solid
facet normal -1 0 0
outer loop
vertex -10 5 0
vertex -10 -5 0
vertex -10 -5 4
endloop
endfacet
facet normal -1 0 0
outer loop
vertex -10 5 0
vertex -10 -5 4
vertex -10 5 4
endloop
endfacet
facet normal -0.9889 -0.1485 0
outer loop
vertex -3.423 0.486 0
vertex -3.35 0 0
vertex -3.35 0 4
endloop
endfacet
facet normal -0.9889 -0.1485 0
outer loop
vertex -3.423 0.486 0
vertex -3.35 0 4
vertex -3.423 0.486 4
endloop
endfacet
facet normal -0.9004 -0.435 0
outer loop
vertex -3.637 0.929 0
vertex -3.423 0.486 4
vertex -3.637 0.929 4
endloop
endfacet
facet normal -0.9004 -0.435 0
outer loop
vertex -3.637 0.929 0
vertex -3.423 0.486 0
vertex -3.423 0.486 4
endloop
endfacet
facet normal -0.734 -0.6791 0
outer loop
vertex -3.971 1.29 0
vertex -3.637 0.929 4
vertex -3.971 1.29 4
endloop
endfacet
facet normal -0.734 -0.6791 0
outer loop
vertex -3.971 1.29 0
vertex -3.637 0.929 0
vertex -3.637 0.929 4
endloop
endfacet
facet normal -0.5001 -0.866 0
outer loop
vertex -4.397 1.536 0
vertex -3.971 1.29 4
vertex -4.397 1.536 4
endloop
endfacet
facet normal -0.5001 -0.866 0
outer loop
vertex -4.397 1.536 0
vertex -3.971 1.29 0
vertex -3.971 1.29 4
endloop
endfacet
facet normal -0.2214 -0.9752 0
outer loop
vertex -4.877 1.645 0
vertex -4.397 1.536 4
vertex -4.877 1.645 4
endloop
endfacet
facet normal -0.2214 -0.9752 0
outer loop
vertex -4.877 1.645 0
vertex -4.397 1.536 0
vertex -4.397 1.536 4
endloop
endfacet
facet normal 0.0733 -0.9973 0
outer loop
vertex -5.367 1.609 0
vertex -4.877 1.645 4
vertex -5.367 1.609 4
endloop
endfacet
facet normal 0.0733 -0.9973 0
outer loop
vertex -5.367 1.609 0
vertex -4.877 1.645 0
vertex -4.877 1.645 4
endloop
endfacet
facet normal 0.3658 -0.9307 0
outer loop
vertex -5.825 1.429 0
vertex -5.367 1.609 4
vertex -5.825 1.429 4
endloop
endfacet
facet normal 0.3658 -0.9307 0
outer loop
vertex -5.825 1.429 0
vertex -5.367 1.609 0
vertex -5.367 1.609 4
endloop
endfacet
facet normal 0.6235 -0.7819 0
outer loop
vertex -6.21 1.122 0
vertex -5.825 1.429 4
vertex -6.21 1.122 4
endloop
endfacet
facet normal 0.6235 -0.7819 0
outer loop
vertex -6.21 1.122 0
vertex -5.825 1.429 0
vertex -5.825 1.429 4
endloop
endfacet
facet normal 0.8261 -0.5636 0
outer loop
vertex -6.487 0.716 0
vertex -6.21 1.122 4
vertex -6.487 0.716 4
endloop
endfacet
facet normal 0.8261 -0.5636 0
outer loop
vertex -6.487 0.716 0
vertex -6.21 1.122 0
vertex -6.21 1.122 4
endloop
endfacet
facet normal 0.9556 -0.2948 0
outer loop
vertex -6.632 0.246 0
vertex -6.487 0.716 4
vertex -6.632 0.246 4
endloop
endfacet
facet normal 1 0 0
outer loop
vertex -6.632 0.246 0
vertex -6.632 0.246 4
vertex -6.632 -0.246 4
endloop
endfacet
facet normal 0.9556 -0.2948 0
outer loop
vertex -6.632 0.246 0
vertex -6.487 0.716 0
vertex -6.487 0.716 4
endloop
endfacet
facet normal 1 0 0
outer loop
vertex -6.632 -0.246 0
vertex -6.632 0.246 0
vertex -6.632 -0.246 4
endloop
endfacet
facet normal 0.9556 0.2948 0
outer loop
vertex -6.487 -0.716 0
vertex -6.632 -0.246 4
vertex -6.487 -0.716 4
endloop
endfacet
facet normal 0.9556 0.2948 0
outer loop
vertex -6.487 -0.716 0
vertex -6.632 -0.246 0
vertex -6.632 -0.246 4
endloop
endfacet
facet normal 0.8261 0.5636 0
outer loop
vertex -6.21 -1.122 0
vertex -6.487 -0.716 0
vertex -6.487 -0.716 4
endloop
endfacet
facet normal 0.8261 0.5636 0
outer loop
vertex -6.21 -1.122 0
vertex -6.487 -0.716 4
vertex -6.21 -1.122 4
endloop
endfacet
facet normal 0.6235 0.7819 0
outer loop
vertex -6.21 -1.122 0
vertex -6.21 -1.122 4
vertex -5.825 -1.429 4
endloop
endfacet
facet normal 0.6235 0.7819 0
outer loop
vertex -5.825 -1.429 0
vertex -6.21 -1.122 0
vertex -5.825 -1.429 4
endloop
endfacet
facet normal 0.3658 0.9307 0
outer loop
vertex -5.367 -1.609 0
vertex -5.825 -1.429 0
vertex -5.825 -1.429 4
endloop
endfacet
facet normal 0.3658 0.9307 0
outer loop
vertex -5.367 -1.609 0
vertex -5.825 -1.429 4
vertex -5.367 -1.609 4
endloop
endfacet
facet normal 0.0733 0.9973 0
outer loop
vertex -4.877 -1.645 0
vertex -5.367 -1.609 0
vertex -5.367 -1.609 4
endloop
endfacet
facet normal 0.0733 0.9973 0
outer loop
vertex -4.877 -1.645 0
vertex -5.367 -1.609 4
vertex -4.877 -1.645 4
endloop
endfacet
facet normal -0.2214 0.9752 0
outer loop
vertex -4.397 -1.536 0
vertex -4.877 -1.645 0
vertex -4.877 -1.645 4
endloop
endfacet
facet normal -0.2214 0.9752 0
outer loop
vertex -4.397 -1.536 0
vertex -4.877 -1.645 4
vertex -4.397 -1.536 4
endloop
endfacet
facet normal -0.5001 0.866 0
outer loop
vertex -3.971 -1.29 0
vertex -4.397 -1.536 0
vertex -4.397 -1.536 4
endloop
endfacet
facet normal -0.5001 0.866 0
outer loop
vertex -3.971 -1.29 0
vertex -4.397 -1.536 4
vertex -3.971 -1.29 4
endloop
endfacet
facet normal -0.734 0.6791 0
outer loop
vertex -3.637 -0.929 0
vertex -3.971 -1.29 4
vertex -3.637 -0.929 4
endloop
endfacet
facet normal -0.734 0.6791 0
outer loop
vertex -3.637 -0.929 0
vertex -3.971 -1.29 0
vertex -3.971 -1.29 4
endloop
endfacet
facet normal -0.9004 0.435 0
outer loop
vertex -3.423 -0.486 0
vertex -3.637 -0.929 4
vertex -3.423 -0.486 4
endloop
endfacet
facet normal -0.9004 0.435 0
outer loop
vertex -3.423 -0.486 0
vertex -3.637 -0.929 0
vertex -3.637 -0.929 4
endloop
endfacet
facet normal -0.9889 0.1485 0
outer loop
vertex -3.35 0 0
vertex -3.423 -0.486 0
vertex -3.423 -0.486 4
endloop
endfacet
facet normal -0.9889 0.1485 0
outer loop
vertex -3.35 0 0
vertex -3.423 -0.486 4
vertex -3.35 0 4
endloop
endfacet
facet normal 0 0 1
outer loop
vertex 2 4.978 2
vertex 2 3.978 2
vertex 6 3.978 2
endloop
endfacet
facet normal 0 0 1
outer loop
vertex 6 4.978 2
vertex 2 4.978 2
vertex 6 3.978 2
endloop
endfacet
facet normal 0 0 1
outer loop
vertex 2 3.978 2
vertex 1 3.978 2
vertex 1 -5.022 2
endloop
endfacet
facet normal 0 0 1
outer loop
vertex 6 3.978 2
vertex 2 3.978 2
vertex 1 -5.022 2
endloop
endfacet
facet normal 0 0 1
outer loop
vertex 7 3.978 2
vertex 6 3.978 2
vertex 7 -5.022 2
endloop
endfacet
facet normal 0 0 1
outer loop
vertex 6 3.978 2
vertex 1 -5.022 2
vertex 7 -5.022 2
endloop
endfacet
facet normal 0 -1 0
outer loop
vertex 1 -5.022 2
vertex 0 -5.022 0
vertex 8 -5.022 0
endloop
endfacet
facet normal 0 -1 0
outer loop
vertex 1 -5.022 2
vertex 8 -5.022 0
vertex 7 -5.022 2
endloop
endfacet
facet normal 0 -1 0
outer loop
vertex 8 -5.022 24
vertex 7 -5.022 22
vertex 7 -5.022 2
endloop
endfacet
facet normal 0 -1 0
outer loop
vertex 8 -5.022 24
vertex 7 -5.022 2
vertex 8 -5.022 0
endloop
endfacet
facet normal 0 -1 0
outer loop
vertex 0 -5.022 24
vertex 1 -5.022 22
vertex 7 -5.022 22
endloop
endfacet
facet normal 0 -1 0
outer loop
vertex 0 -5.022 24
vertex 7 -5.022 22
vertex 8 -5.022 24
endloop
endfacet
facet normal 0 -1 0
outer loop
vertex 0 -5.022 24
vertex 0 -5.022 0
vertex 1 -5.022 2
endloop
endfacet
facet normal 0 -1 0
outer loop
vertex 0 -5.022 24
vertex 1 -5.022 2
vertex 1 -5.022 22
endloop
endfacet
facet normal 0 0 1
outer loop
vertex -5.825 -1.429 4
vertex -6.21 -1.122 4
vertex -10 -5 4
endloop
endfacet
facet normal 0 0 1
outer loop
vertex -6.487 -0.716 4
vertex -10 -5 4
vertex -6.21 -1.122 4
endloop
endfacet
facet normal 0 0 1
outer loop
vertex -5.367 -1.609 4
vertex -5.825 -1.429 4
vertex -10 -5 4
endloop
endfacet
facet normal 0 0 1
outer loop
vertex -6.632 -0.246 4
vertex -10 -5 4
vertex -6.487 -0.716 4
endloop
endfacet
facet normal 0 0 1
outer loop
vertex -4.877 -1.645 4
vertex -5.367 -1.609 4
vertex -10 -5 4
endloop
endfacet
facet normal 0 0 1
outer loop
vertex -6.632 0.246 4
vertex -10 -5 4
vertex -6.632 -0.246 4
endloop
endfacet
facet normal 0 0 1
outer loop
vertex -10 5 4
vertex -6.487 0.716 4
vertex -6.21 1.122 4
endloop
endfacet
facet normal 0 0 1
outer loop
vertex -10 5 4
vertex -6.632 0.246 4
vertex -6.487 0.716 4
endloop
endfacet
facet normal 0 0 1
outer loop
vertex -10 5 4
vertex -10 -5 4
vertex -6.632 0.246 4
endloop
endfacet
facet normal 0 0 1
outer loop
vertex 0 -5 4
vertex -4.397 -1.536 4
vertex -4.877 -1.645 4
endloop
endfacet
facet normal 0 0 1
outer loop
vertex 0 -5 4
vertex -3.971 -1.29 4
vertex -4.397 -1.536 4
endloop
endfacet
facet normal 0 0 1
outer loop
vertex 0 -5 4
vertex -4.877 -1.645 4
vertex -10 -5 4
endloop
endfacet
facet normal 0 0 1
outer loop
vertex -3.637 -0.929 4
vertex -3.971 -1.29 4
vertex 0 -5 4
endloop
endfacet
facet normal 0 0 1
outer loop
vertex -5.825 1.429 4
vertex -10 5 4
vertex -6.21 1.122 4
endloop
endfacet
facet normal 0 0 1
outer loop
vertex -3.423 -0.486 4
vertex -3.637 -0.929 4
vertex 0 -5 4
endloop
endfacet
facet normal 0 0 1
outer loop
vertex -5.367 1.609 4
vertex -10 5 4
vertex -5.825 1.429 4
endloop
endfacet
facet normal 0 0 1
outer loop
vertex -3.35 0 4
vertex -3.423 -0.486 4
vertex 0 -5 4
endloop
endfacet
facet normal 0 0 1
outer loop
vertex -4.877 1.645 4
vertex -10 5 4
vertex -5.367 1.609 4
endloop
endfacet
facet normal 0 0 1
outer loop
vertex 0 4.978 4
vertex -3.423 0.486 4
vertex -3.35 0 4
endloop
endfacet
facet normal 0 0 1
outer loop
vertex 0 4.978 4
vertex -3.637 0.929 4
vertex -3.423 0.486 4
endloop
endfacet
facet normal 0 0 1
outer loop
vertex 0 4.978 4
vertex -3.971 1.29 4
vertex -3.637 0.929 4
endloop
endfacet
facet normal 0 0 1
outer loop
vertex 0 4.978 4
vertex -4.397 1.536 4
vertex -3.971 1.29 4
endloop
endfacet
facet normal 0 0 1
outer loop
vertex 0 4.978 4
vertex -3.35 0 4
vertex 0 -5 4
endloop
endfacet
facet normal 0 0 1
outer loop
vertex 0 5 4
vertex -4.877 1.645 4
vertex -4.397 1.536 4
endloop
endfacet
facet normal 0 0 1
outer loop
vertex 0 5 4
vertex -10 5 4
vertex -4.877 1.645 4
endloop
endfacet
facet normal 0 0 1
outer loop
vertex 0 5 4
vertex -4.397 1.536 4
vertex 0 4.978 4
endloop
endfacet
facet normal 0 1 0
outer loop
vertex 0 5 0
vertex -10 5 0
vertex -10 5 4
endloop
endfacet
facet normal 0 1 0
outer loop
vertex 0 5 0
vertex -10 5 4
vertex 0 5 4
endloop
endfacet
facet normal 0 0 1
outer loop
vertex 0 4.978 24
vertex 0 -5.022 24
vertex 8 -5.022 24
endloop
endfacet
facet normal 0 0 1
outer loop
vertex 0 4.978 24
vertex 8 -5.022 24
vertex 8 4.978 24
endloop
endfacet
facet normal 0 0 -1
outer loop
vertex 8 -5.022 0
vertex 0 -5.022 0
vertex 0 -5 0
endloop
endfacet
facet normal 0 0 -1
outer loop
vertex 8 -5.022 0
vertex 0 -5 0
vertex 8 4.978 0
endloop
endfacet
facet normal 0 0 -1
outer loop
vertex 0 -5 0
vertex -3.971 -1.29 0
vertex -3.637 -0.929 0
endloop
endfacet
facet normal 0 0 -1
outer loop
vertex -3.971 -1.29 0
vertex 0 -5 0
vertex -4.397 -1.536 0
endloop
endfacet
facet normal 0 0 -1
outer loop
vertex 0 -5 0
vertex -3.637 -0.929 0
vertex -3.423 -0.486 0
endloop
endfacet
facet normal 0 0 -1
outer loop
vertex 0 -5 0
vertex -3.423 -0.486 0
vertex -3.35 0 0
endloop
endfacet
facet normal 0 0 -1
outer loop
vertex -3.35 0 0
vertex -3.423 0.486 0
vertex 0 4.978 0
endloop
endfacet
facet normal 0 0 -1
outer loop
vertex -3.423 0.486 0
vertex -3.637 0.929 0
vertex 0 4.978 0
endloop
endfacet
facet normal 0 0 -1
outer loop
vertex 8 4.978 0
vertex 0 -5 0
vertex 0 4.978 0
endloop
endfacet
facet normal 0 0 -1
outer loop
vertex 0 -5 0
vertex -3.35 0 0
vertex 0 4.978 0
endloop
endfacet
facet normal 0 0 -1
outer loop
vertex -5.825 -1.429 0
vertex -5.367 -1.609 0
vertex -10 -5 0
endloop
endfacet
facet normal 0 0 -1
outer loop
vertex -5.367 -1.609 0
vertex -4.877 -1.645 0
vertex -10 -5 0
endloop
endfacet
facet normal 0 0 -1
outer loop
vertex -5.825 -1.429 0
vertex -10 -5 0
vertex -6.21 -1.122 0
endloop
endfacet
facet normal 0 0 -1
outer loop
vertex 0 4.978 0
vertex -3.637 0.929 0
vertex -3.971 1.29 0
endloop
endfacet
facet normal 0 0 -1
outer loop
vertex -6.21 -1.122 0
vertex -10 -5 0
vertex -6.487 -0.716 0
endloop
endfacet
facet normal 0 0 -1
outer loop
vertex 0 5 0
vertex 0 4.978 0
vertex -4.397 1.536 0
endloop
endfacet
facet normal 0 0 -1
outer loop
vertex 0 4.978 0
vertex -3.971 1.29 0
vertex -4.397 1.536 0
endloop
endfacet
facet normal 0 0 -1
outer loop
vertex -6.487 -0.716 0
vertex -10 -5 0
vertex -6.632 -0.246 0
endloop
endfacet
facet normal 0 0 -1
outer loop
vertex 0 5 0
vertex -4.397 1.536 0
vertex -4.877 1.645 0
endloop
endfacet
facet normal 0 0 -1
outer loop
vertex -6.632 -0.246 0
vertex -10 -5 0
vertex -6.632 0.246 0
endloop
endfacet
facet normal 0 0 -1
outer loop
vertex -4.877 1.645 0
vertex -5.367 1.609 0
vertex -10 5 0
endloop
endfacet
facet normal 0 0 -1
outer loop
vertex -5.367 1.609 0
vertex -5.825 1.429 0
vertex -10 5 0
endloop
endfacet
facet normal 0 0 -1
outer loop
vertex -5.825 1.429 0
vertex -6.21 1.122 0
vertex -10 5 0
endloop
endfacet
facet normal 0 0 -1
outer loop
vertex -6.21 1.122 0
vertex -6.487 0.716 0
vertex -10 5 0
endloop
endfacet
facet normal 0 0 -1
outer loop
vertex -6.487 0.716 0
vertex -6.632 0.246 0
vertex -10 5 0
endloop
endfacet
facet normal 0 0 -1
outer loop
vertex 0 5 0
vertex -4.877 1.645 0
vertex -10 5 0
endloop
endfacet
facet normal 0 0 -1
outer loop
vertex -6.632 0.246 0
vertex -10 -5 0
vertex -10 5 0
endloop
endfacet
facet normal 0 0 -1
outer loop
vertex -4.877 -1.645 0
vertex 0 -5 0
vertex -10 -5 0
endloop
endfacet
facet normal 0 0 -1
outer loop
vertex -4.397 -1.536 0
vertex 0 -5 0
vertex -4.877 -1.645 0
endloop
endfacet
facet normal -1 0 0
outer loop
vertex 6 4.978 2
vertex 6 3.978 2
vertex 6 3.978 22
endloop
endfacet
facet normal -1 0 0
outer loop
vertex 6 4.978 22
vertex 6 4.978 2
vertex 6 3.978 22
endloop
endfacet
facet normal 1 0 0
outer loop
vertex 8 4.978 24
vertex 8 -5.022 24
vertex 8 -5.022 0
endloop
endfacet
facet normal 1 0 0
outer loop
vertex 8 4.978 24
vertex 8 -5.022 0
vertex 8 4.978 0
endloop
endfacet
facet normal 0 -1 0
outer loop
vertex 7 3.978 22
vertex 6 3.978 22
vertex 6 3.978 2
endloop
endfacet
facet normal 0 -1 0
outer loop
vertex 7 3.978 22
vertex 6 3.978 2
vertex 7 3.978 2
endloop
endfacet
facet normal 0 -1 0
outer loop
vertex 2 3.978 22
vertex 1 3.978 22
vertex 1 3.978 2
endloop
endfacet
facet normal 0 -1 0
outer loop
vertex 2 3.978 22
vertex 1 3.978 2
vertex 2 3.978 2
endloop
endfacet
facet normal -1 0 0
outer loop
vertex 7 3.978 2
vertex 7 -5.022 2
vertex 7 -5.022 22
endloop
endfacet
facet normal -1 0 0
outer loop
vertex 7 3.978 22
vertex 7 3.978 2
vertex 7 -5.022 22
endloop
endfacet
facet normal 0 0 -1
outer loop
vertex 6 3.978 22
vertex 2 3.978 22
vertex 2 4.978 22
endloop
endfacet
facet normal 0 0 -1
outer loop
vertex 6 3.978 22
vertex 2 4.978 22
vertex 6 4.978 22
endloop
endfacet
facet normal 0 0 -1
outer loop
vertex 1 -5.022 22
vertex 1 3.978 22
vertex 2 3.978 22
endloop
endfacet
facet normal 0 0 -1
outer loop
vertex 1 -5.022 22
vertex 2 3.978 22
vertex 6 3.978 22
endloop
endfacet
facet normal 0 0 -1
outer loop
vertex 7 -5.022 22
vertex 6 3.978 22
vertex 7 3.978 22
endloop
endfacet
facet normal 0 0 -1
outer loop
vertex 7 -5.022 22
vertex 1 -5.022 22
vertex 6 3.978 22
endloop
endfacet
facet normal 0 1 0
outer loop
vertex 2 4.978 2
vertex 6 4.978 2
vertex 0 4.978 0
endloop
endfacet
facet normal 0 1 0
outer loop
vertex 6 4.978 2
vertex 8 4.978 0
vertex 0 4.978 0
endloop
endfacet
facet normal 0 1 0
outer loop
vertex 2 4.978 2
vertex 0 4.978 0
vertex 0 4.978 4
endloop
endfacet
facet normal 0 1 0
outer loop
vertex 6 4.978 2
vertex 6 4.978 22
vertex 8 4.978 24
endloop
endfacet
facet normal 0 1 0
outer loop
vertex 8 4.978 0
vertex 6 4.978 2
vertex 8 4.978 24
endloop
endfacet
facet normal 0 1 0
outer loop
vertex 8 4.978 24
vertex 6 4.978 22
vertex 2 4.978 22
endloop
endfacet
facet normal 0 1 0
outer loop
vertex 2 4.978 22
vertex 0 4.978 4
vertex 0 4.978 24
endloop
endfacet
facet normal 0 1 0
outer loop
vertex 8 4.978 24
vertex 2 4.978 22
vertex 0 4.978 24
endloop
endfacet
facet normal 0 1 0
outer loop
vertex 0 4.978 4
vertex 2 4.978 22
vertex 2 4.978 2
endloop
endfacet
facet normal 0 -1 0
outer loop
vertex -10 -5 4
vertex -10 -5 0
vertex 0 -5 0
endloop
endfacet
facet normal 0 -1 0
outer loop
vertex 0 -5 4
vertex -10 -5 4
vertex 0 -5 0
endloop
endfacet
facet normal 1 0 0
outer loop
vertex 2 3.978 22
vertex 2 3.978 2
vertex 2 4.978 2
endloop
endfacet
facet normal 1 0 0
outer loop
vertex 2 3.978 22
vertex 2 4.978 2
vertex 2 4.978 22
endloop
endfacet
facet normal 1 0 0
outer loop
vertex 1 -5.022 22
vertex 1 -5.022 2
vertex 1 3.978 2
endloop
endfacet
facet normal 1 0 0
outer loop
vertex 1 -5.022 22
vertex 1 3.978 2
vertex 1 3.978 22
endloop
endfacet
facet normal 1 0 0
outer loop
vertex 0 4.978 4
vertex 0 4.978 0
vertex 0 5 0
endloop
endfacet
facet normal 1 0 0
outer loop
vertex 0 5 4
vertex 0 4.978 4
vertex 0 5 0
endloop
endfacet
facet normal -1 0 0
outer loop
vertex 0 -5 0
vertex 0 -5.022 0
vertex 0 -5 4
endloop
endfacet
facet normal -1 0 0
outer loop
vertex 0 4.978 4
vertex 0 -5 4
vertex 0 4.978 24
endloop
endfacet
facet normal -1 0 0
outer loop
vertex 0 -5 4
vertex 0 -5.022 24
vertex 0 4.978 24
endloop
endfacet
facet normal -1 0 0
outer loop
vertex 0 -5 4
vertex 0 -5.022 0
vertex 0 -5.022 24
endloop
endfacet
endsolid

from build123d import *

# Parameters (mm, degrees)
SKETCH_W        = 10
SKETCH_H        = 10
SKETCH_R        = 1.65
PAD_DEPTH       = 4
SKETCH001_W     = 10
SKETCH001_H     = 24
PAD001_DEPTH    = 8
SKETCH002_W     = 6
SKETCH002_H     = 20
POCKET_DEPTH    = 9
SKETCH003_W     = 4
SKETCH003_H     = 20
POCKET001_DEPTH = 5


with BuildPart() as part:
    # Sketch → Pad (new body)
    with BuildSketch(Plane.XY):
        with Locations((-5, 0)):
            Rectangle(SKETCH_W, SKETCH_H)
        with Locations((-5, 0)):
            Circle(SKETCH_R, mode=Mode.SUBTRACT)
    extrude(amount=PAD_DEPTH)

    # Sketch001 → Pad001 (join)
    with BuildSketch(Plane.YZ):
        with Locations((-0.02241, 12)):
            Rectangle(SKETCH001_W, SKETCH001_H)
    extrude(amount=PAD001_DEPTH)

    # Sketch002 (on Face11 of Pad001) → Pocket (cut)
    with BuildSketch(Plane.XZ.offset(5.02241)):
        with Locations((4, 12)):
            Rectangle(SKETCH002_W, SKETCH002_H)
    extrude(amount=-POCKET_DEPTH, mode=Mode.SUBTRACT)

    # Sketch003 (on Face18 of Pocket) → Pocket001 (cut)
    with BuildSketch(Plane.XZ.offset(-3.97759)):
        with Locations((4, 12)):
            Rectangle(SKETCH003_W, SKETCH003_H)
    extrude(amount=-POCKET001_DEPTH, mode=Mode.SUBTRACT)


solid = part.part
